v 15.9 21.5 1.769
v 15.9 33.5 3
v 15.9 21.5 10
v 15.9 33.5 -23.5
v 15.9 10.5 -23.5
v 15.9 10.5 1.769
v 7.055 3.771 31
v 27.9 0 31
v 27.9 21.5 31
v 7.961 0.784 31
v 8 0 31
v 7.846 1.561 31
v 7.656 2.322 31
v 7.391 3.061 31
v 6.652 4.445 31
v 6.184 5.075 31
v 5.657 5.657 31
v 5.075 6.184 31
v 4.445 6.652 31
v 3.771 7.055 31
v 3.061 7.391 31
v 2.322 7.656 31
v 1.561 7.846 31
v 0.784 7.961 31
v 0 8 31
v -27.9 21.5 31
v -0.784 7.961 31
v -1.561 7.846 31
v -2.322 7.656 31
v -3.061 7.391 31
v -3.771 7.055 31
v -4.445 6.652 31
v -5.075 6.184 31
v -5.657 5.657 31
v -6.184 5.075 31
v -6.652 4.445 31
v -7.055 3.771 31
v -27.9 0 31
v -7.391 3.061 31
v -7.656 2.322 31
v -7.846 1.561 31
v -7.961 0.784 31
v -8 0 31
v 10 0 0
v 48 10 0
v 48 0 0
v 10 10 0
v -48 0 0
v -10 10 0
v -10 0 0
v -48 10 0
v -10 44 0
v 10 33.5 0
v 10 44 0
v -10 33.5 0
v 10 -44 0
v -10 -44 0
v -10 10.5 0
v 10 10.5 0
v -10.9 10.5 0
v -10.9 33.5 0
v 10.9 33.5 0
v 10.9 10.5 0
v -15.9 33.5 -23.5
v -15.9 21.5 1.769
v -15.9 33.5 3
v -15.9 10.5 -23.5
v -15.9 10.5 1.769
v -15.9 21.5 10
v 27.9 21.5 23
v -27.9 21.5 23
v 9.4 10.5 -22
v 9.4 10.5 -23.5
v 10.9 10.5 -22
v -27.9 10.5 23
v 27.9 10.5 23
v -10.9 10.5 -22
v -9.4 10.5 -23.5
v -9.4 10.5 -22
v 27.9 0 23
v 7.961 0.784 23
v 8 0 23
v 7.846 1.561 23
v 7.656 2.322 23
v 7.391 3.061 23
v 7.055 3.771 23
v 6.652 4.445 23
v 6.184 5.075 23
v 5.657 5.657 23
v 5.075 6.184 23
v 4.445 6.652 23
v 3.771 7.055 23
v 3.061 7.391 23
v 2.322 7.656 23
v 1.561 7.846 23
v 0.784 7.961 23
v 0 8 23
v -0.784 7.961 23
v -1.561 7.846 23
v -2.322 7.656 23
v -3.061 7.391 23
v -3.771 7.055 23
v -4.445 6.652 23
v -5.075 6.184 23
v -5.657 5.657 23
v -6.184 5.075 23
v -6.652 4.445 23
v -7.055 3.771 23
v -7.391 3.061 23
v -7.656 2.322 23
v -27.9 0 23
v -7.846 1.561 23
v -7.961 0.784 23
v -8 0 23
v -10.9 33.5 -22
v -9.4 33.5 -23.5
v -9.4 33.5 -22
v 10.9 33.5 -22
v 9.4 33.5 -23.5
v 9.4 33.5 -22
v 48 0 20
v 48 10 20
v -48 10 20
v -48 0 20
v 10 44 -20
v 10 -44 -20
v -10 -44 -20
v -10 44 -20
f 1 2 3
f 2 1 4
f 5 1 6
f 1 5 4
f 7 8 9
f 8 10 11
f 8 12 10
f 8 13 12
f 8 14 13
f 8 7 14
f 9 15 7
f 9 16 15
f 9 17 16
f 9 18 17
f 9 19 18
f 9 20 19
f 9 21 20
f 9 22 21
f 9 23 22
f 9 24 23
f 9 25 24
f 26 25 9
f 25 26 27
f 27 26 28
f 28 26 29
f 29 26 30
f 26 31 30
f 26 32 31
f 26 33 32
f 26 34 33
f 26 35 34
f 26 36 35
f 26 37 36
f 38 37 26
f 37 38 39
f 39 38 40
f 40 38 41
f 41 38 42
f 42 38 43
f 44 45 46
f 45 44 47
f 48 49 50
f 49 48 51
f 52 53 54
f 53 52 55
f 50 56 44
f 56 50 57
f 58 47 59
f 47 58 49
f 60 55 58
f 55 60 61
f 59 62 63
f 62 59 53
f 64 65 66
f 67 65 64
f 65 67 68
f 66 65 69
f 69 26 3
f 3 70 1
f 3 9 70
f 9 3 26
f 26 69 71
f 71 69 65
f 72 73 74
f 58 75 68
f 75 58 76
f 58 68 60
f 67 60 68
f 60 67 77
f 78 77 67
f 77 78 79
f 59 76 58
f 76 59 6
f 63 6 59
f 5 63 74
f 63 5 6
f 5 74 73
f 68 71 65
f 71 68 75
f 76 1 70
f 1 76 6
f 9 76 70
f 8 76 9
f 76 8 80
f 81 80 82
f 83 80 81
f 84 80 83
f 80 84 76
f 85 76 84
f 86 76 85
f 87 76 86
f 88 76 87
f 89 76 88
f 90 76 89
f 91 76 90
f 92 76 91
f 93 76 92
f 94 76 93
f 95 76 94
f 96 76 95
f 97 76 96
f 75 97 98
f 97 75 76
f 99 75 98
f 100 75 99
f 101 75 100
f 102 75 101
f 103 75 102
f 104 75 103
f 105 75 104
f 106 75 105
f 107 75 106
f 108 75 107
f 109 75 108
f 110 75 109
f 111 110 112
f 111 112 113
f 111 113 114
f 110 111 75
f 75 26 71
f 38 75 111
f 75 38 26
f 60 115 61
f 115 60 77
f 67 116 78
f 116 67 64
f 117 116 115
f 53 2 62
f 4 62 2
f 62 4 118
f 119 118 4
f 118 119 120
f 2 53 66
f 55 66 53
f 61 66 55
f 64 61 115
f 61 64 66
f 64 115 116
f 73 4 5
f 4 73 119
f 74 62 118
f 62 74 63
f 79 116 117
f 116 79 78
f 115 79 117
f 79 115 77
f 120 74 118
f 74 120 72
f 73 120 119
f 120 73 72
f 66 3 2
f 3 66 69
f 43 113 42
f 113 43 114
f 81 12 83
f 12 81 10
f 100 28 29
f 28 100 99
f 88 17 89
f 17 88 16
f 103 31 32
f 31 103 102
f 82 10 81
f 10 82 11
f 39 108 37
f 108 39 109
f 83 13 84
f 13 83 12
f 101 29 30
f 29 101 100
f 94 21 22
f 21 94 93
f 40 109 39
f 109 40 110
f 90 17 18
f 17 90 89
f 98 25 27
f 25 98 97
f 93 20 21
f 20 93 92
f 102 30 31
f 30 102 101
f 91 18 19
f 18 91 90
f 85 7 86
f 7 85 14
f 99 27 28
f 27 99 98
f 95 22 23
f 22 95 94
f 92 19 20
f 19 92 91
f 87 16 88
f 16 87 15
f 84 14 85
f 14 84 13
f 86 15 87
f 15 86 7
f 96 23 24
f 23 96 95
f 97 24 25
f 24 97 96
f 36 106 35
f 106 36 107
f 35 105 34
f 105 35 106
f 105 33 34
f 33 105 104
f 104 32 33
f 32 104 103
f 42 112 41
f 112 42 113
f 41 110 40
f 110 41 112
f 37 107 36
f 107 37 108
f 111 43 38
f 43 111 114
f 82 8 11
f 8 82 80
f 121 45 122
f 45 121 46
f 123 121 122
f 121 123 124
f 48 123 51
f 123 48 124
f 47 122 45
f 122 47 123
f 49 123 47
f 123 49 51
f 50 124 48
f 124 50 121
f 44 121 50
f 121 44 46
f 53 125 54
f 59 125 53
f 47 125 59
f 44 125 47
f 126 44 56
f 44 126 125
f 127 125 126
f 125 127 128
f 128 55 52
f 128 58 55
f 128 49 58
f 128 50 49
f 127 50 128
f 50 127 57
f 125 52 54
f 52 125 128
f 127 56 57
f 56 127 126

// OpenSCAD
// file: ../perpendicular-u-joint-guard-v1.11-fit-21xy-22z/fit_clearance_guard.scad
// v1.11, mm. X=upper gray tube axis; Y=blue foot axis; Z=up.
// Resize mating envelopes, NOT a global scale: walls, eaves, bore and ramp
// heights keep their accepted sizes. Actual context tubes remain 20x20.
$fn=48;

module guard_v1_11(nx=21,ny=21,nz=22,feature="all") {
    wall=5;
    inner_x=nx+0.8; // Preserve the pre-existing PETG printing relief.
    outer_x=inner_x+2*wall;
    wall_x=inner_x/2+wall/2;
    inner_y=ny/2;
    root_y=inner_y+11;
    tip_y=root_y+12;
    roof_bottom=nz+1;
    roof_top=roof_bottom+8;
    roof_half_x=outer_x/2+12;
    bottom_z=-nz-1.5;
    // Keep the real 20 mm foot's 0.6 mm engagement rather than moving the
    // lip tip outward with nx (which would leave only 0.1 mm engagement).
    lip_tip_x=20/2-0.6;
    lip_depth=wall_x-lip_tip_x;

    assert(nx>=20 && ny>=20 && nz>=20);
    assert(lip_depth>0 && lip_depth<wall+inner_x/2);

    module upper_body() {
        for(s=[-1,1]) {
            // Solid XZ upper U web, down from the roof to blue top Z=0.
            translate([0,s*(inner_y+root_y)/2,roof_top/2])
                cube([outer_x,11,roof_top],center=true);
            translate([s*wall_x,0,roof_top/2])
                cube([wall,2*root_y,roof_top],center=true);
        }
        translate([0,0,roof_bottom+4])
            cube([2*roof_half_x,2*root_y,8],center=true);
        for(sx=[-1,1]) for(sy=[-1,1])
            translate([0,sy*(inner_y+root_y)/2,0])
                rotate([90,0,0]) linear_extrude(height=11,center=true)
                    polygon([
                        [sx*roof_half_x,roof_bottom],
                        [sx*(outer_x/2-1),roof_bottom+0.5],
                        [sx*(outer_x/2-1),0]
                    ]);
    }
    module hooks() {
        for(sx=[-1,1]) for(sy=[-1,1])
            translate([sx*(lip_tip_x+lip_depth/2),
                       sy*(inner_y+tip_y)/2,-nz-0.75])
                cube([lip_depth,tip_y-inner_y,1.5],center=true);
    }
    module lower_body() {
        for(sx=[-1,1]) for(sy=[-1,1])
            translate([sx*wall_x,sy*(inner_y+tip_y)/2,bottom_z/2])
                cube([wall,tip_y-inner_y,-bottom_z],center=true);
        hooks();
    }
    module positive_ramp() {
        rotate([90,0,90]) linear_extrude(height=outer_x,center=true)
            polygon([[root_y-0.2,0],[tip_y,0],[tip_y,3],
                     [root_y,10],[root_y-0.2,10]]);
    }
    module end_ramps() {
        positive_ramp(); mirror([0,1,0]) positive_ramp();
        for(sx=[-1,1]) for(sy=[-1,1])
            translate([sx*wall_x,sy*(root_y+tip_y)/2,0])
                cube([wall,12,0.4],center=true);
    }

    difference() {
        union() {
            if(feature=="all" || feature=="upper") upper_body();
            if(feature=="all" || feature=="lower") lower_body();
            if(feature=="all" || feature=="ramps") end_ramps();
            if(feature=="hooks") hooks();
        }
        // True, unstepped round nut passage through the ENTIRE final part.
        cylinder(d=16,h=160,center=true,$fn=64);
        // Bottom-open gray-tube entry, ny wide and nz high. This removes
        // upper rigid interference without deleting either XZ solid web.
        translate([-60,-ny/2,-60]) cube([120,ny,60+nz]);
    }
}

guard_v1_11();
// file: flush_roof_guard.scad
// v1.12, mm. X=upper gray tube; Y=blue foot; Z=up.
// Only remove the two 5 x ny x 1 mm ribs below the roof over the gray tube.
// Keep v1.11 as an immutable dependency; no rescaling or other geometry edits.
use <../perpendicular-u-joint-guard-v1.11-fit-21xy-22z/fit_clearance_guard.scad>;

module guard_v1_12(nx=21,ny=21,nz=22,feature="all") {
    roof_bottom=nz+1; // Same accepted 8 mm roof: Z=23..31 at defaults.
    difference() {
        guard_v1_11(nx,ny,nz,feature);
        // The old entry stopped at nz, leaving the arms' last 1 mm intact.
        // Cut to the actual roof underside, not into the roof or XZ webs.
        translate([-60,-ny/2,-60]) cube([120,ny,60+roof_bottom]);
    }
}

guard_v1_12();
// main file
// Real source geometry; diagnostic views/Boolean checks, not a print plate.
use <flush_roof_guard.scad>;
use <../perpendicular-u-joint-guard-v1.11-fit-21xy-22z/fit_clearance_guard.scad>;
VIEW="section";

module half_space() { translate([-65,0,-35]) cube([130,65,85]); }
module nominal_tubes(section=false) {
    // Physical tubes remain 20 x 20 in the established, unshifted frame.
    color([0.55,0.59,0.64]) render(convexity=12) intersection() {
        translate([-48,-10,0]) cube([96,20,20]);
        if(section) half_space();
    }
    // Keep the blue foot complete so both ends remain visible.
    color([0.13,0.32,0.7]) translate([-10,-44,-20]) cube([20,88,20]);
}
module colored_clip(section=false) {
    color([0.95,0.47,0.1]) render(convexity=12) intersection() {
        guard_v1_12();
        if(section) half_space();
    }
}
module expected_ribs(inset=0) {
    for(s=[-1,1])
        translate([s*13.4,0,22.5])
            cube([5-2*inset,21-2*inset,1-2*inset],center=true);
}
module removed() { difference() { guard_v1_11(); guard_v1_12(); } }

if(VIEW=="clip") guard_v1_12();
else if(VIEW=="added") difference() { guard_v1_12(); guard_v1_11(); }
else if(VIEW=="removed") removed();
else if(VIEW=="removed_outside_expected") difference() { removed(); expected_ribs(); }
else if(VIEW=="expected_missing") difference() { expected_ribs(0.001); removed(); }
else if(VIEW=="rib_residue") intersection() { guard_v1_12(); expected_ribs(0.001); }
else if(VIEW=="mirror_difference") {
    difference() { guard_v1_12(); mirror([0,1,0]) guard_v1_12(); }
    difference() { mirror([0,1,0]) guard_v1_12(); guard_v1_12(); }
}
else if(VIEW=="roof_obstruction") intersection() {
    guard_v1_12(); translate([-55,-10.499,22.001]) cube([110,20.998,0.998]);
}
else if(VIEW=="section") { colored_clip(true); nominal_tubes(true); }
else { colored_clip(); nominal_tubes(); }
